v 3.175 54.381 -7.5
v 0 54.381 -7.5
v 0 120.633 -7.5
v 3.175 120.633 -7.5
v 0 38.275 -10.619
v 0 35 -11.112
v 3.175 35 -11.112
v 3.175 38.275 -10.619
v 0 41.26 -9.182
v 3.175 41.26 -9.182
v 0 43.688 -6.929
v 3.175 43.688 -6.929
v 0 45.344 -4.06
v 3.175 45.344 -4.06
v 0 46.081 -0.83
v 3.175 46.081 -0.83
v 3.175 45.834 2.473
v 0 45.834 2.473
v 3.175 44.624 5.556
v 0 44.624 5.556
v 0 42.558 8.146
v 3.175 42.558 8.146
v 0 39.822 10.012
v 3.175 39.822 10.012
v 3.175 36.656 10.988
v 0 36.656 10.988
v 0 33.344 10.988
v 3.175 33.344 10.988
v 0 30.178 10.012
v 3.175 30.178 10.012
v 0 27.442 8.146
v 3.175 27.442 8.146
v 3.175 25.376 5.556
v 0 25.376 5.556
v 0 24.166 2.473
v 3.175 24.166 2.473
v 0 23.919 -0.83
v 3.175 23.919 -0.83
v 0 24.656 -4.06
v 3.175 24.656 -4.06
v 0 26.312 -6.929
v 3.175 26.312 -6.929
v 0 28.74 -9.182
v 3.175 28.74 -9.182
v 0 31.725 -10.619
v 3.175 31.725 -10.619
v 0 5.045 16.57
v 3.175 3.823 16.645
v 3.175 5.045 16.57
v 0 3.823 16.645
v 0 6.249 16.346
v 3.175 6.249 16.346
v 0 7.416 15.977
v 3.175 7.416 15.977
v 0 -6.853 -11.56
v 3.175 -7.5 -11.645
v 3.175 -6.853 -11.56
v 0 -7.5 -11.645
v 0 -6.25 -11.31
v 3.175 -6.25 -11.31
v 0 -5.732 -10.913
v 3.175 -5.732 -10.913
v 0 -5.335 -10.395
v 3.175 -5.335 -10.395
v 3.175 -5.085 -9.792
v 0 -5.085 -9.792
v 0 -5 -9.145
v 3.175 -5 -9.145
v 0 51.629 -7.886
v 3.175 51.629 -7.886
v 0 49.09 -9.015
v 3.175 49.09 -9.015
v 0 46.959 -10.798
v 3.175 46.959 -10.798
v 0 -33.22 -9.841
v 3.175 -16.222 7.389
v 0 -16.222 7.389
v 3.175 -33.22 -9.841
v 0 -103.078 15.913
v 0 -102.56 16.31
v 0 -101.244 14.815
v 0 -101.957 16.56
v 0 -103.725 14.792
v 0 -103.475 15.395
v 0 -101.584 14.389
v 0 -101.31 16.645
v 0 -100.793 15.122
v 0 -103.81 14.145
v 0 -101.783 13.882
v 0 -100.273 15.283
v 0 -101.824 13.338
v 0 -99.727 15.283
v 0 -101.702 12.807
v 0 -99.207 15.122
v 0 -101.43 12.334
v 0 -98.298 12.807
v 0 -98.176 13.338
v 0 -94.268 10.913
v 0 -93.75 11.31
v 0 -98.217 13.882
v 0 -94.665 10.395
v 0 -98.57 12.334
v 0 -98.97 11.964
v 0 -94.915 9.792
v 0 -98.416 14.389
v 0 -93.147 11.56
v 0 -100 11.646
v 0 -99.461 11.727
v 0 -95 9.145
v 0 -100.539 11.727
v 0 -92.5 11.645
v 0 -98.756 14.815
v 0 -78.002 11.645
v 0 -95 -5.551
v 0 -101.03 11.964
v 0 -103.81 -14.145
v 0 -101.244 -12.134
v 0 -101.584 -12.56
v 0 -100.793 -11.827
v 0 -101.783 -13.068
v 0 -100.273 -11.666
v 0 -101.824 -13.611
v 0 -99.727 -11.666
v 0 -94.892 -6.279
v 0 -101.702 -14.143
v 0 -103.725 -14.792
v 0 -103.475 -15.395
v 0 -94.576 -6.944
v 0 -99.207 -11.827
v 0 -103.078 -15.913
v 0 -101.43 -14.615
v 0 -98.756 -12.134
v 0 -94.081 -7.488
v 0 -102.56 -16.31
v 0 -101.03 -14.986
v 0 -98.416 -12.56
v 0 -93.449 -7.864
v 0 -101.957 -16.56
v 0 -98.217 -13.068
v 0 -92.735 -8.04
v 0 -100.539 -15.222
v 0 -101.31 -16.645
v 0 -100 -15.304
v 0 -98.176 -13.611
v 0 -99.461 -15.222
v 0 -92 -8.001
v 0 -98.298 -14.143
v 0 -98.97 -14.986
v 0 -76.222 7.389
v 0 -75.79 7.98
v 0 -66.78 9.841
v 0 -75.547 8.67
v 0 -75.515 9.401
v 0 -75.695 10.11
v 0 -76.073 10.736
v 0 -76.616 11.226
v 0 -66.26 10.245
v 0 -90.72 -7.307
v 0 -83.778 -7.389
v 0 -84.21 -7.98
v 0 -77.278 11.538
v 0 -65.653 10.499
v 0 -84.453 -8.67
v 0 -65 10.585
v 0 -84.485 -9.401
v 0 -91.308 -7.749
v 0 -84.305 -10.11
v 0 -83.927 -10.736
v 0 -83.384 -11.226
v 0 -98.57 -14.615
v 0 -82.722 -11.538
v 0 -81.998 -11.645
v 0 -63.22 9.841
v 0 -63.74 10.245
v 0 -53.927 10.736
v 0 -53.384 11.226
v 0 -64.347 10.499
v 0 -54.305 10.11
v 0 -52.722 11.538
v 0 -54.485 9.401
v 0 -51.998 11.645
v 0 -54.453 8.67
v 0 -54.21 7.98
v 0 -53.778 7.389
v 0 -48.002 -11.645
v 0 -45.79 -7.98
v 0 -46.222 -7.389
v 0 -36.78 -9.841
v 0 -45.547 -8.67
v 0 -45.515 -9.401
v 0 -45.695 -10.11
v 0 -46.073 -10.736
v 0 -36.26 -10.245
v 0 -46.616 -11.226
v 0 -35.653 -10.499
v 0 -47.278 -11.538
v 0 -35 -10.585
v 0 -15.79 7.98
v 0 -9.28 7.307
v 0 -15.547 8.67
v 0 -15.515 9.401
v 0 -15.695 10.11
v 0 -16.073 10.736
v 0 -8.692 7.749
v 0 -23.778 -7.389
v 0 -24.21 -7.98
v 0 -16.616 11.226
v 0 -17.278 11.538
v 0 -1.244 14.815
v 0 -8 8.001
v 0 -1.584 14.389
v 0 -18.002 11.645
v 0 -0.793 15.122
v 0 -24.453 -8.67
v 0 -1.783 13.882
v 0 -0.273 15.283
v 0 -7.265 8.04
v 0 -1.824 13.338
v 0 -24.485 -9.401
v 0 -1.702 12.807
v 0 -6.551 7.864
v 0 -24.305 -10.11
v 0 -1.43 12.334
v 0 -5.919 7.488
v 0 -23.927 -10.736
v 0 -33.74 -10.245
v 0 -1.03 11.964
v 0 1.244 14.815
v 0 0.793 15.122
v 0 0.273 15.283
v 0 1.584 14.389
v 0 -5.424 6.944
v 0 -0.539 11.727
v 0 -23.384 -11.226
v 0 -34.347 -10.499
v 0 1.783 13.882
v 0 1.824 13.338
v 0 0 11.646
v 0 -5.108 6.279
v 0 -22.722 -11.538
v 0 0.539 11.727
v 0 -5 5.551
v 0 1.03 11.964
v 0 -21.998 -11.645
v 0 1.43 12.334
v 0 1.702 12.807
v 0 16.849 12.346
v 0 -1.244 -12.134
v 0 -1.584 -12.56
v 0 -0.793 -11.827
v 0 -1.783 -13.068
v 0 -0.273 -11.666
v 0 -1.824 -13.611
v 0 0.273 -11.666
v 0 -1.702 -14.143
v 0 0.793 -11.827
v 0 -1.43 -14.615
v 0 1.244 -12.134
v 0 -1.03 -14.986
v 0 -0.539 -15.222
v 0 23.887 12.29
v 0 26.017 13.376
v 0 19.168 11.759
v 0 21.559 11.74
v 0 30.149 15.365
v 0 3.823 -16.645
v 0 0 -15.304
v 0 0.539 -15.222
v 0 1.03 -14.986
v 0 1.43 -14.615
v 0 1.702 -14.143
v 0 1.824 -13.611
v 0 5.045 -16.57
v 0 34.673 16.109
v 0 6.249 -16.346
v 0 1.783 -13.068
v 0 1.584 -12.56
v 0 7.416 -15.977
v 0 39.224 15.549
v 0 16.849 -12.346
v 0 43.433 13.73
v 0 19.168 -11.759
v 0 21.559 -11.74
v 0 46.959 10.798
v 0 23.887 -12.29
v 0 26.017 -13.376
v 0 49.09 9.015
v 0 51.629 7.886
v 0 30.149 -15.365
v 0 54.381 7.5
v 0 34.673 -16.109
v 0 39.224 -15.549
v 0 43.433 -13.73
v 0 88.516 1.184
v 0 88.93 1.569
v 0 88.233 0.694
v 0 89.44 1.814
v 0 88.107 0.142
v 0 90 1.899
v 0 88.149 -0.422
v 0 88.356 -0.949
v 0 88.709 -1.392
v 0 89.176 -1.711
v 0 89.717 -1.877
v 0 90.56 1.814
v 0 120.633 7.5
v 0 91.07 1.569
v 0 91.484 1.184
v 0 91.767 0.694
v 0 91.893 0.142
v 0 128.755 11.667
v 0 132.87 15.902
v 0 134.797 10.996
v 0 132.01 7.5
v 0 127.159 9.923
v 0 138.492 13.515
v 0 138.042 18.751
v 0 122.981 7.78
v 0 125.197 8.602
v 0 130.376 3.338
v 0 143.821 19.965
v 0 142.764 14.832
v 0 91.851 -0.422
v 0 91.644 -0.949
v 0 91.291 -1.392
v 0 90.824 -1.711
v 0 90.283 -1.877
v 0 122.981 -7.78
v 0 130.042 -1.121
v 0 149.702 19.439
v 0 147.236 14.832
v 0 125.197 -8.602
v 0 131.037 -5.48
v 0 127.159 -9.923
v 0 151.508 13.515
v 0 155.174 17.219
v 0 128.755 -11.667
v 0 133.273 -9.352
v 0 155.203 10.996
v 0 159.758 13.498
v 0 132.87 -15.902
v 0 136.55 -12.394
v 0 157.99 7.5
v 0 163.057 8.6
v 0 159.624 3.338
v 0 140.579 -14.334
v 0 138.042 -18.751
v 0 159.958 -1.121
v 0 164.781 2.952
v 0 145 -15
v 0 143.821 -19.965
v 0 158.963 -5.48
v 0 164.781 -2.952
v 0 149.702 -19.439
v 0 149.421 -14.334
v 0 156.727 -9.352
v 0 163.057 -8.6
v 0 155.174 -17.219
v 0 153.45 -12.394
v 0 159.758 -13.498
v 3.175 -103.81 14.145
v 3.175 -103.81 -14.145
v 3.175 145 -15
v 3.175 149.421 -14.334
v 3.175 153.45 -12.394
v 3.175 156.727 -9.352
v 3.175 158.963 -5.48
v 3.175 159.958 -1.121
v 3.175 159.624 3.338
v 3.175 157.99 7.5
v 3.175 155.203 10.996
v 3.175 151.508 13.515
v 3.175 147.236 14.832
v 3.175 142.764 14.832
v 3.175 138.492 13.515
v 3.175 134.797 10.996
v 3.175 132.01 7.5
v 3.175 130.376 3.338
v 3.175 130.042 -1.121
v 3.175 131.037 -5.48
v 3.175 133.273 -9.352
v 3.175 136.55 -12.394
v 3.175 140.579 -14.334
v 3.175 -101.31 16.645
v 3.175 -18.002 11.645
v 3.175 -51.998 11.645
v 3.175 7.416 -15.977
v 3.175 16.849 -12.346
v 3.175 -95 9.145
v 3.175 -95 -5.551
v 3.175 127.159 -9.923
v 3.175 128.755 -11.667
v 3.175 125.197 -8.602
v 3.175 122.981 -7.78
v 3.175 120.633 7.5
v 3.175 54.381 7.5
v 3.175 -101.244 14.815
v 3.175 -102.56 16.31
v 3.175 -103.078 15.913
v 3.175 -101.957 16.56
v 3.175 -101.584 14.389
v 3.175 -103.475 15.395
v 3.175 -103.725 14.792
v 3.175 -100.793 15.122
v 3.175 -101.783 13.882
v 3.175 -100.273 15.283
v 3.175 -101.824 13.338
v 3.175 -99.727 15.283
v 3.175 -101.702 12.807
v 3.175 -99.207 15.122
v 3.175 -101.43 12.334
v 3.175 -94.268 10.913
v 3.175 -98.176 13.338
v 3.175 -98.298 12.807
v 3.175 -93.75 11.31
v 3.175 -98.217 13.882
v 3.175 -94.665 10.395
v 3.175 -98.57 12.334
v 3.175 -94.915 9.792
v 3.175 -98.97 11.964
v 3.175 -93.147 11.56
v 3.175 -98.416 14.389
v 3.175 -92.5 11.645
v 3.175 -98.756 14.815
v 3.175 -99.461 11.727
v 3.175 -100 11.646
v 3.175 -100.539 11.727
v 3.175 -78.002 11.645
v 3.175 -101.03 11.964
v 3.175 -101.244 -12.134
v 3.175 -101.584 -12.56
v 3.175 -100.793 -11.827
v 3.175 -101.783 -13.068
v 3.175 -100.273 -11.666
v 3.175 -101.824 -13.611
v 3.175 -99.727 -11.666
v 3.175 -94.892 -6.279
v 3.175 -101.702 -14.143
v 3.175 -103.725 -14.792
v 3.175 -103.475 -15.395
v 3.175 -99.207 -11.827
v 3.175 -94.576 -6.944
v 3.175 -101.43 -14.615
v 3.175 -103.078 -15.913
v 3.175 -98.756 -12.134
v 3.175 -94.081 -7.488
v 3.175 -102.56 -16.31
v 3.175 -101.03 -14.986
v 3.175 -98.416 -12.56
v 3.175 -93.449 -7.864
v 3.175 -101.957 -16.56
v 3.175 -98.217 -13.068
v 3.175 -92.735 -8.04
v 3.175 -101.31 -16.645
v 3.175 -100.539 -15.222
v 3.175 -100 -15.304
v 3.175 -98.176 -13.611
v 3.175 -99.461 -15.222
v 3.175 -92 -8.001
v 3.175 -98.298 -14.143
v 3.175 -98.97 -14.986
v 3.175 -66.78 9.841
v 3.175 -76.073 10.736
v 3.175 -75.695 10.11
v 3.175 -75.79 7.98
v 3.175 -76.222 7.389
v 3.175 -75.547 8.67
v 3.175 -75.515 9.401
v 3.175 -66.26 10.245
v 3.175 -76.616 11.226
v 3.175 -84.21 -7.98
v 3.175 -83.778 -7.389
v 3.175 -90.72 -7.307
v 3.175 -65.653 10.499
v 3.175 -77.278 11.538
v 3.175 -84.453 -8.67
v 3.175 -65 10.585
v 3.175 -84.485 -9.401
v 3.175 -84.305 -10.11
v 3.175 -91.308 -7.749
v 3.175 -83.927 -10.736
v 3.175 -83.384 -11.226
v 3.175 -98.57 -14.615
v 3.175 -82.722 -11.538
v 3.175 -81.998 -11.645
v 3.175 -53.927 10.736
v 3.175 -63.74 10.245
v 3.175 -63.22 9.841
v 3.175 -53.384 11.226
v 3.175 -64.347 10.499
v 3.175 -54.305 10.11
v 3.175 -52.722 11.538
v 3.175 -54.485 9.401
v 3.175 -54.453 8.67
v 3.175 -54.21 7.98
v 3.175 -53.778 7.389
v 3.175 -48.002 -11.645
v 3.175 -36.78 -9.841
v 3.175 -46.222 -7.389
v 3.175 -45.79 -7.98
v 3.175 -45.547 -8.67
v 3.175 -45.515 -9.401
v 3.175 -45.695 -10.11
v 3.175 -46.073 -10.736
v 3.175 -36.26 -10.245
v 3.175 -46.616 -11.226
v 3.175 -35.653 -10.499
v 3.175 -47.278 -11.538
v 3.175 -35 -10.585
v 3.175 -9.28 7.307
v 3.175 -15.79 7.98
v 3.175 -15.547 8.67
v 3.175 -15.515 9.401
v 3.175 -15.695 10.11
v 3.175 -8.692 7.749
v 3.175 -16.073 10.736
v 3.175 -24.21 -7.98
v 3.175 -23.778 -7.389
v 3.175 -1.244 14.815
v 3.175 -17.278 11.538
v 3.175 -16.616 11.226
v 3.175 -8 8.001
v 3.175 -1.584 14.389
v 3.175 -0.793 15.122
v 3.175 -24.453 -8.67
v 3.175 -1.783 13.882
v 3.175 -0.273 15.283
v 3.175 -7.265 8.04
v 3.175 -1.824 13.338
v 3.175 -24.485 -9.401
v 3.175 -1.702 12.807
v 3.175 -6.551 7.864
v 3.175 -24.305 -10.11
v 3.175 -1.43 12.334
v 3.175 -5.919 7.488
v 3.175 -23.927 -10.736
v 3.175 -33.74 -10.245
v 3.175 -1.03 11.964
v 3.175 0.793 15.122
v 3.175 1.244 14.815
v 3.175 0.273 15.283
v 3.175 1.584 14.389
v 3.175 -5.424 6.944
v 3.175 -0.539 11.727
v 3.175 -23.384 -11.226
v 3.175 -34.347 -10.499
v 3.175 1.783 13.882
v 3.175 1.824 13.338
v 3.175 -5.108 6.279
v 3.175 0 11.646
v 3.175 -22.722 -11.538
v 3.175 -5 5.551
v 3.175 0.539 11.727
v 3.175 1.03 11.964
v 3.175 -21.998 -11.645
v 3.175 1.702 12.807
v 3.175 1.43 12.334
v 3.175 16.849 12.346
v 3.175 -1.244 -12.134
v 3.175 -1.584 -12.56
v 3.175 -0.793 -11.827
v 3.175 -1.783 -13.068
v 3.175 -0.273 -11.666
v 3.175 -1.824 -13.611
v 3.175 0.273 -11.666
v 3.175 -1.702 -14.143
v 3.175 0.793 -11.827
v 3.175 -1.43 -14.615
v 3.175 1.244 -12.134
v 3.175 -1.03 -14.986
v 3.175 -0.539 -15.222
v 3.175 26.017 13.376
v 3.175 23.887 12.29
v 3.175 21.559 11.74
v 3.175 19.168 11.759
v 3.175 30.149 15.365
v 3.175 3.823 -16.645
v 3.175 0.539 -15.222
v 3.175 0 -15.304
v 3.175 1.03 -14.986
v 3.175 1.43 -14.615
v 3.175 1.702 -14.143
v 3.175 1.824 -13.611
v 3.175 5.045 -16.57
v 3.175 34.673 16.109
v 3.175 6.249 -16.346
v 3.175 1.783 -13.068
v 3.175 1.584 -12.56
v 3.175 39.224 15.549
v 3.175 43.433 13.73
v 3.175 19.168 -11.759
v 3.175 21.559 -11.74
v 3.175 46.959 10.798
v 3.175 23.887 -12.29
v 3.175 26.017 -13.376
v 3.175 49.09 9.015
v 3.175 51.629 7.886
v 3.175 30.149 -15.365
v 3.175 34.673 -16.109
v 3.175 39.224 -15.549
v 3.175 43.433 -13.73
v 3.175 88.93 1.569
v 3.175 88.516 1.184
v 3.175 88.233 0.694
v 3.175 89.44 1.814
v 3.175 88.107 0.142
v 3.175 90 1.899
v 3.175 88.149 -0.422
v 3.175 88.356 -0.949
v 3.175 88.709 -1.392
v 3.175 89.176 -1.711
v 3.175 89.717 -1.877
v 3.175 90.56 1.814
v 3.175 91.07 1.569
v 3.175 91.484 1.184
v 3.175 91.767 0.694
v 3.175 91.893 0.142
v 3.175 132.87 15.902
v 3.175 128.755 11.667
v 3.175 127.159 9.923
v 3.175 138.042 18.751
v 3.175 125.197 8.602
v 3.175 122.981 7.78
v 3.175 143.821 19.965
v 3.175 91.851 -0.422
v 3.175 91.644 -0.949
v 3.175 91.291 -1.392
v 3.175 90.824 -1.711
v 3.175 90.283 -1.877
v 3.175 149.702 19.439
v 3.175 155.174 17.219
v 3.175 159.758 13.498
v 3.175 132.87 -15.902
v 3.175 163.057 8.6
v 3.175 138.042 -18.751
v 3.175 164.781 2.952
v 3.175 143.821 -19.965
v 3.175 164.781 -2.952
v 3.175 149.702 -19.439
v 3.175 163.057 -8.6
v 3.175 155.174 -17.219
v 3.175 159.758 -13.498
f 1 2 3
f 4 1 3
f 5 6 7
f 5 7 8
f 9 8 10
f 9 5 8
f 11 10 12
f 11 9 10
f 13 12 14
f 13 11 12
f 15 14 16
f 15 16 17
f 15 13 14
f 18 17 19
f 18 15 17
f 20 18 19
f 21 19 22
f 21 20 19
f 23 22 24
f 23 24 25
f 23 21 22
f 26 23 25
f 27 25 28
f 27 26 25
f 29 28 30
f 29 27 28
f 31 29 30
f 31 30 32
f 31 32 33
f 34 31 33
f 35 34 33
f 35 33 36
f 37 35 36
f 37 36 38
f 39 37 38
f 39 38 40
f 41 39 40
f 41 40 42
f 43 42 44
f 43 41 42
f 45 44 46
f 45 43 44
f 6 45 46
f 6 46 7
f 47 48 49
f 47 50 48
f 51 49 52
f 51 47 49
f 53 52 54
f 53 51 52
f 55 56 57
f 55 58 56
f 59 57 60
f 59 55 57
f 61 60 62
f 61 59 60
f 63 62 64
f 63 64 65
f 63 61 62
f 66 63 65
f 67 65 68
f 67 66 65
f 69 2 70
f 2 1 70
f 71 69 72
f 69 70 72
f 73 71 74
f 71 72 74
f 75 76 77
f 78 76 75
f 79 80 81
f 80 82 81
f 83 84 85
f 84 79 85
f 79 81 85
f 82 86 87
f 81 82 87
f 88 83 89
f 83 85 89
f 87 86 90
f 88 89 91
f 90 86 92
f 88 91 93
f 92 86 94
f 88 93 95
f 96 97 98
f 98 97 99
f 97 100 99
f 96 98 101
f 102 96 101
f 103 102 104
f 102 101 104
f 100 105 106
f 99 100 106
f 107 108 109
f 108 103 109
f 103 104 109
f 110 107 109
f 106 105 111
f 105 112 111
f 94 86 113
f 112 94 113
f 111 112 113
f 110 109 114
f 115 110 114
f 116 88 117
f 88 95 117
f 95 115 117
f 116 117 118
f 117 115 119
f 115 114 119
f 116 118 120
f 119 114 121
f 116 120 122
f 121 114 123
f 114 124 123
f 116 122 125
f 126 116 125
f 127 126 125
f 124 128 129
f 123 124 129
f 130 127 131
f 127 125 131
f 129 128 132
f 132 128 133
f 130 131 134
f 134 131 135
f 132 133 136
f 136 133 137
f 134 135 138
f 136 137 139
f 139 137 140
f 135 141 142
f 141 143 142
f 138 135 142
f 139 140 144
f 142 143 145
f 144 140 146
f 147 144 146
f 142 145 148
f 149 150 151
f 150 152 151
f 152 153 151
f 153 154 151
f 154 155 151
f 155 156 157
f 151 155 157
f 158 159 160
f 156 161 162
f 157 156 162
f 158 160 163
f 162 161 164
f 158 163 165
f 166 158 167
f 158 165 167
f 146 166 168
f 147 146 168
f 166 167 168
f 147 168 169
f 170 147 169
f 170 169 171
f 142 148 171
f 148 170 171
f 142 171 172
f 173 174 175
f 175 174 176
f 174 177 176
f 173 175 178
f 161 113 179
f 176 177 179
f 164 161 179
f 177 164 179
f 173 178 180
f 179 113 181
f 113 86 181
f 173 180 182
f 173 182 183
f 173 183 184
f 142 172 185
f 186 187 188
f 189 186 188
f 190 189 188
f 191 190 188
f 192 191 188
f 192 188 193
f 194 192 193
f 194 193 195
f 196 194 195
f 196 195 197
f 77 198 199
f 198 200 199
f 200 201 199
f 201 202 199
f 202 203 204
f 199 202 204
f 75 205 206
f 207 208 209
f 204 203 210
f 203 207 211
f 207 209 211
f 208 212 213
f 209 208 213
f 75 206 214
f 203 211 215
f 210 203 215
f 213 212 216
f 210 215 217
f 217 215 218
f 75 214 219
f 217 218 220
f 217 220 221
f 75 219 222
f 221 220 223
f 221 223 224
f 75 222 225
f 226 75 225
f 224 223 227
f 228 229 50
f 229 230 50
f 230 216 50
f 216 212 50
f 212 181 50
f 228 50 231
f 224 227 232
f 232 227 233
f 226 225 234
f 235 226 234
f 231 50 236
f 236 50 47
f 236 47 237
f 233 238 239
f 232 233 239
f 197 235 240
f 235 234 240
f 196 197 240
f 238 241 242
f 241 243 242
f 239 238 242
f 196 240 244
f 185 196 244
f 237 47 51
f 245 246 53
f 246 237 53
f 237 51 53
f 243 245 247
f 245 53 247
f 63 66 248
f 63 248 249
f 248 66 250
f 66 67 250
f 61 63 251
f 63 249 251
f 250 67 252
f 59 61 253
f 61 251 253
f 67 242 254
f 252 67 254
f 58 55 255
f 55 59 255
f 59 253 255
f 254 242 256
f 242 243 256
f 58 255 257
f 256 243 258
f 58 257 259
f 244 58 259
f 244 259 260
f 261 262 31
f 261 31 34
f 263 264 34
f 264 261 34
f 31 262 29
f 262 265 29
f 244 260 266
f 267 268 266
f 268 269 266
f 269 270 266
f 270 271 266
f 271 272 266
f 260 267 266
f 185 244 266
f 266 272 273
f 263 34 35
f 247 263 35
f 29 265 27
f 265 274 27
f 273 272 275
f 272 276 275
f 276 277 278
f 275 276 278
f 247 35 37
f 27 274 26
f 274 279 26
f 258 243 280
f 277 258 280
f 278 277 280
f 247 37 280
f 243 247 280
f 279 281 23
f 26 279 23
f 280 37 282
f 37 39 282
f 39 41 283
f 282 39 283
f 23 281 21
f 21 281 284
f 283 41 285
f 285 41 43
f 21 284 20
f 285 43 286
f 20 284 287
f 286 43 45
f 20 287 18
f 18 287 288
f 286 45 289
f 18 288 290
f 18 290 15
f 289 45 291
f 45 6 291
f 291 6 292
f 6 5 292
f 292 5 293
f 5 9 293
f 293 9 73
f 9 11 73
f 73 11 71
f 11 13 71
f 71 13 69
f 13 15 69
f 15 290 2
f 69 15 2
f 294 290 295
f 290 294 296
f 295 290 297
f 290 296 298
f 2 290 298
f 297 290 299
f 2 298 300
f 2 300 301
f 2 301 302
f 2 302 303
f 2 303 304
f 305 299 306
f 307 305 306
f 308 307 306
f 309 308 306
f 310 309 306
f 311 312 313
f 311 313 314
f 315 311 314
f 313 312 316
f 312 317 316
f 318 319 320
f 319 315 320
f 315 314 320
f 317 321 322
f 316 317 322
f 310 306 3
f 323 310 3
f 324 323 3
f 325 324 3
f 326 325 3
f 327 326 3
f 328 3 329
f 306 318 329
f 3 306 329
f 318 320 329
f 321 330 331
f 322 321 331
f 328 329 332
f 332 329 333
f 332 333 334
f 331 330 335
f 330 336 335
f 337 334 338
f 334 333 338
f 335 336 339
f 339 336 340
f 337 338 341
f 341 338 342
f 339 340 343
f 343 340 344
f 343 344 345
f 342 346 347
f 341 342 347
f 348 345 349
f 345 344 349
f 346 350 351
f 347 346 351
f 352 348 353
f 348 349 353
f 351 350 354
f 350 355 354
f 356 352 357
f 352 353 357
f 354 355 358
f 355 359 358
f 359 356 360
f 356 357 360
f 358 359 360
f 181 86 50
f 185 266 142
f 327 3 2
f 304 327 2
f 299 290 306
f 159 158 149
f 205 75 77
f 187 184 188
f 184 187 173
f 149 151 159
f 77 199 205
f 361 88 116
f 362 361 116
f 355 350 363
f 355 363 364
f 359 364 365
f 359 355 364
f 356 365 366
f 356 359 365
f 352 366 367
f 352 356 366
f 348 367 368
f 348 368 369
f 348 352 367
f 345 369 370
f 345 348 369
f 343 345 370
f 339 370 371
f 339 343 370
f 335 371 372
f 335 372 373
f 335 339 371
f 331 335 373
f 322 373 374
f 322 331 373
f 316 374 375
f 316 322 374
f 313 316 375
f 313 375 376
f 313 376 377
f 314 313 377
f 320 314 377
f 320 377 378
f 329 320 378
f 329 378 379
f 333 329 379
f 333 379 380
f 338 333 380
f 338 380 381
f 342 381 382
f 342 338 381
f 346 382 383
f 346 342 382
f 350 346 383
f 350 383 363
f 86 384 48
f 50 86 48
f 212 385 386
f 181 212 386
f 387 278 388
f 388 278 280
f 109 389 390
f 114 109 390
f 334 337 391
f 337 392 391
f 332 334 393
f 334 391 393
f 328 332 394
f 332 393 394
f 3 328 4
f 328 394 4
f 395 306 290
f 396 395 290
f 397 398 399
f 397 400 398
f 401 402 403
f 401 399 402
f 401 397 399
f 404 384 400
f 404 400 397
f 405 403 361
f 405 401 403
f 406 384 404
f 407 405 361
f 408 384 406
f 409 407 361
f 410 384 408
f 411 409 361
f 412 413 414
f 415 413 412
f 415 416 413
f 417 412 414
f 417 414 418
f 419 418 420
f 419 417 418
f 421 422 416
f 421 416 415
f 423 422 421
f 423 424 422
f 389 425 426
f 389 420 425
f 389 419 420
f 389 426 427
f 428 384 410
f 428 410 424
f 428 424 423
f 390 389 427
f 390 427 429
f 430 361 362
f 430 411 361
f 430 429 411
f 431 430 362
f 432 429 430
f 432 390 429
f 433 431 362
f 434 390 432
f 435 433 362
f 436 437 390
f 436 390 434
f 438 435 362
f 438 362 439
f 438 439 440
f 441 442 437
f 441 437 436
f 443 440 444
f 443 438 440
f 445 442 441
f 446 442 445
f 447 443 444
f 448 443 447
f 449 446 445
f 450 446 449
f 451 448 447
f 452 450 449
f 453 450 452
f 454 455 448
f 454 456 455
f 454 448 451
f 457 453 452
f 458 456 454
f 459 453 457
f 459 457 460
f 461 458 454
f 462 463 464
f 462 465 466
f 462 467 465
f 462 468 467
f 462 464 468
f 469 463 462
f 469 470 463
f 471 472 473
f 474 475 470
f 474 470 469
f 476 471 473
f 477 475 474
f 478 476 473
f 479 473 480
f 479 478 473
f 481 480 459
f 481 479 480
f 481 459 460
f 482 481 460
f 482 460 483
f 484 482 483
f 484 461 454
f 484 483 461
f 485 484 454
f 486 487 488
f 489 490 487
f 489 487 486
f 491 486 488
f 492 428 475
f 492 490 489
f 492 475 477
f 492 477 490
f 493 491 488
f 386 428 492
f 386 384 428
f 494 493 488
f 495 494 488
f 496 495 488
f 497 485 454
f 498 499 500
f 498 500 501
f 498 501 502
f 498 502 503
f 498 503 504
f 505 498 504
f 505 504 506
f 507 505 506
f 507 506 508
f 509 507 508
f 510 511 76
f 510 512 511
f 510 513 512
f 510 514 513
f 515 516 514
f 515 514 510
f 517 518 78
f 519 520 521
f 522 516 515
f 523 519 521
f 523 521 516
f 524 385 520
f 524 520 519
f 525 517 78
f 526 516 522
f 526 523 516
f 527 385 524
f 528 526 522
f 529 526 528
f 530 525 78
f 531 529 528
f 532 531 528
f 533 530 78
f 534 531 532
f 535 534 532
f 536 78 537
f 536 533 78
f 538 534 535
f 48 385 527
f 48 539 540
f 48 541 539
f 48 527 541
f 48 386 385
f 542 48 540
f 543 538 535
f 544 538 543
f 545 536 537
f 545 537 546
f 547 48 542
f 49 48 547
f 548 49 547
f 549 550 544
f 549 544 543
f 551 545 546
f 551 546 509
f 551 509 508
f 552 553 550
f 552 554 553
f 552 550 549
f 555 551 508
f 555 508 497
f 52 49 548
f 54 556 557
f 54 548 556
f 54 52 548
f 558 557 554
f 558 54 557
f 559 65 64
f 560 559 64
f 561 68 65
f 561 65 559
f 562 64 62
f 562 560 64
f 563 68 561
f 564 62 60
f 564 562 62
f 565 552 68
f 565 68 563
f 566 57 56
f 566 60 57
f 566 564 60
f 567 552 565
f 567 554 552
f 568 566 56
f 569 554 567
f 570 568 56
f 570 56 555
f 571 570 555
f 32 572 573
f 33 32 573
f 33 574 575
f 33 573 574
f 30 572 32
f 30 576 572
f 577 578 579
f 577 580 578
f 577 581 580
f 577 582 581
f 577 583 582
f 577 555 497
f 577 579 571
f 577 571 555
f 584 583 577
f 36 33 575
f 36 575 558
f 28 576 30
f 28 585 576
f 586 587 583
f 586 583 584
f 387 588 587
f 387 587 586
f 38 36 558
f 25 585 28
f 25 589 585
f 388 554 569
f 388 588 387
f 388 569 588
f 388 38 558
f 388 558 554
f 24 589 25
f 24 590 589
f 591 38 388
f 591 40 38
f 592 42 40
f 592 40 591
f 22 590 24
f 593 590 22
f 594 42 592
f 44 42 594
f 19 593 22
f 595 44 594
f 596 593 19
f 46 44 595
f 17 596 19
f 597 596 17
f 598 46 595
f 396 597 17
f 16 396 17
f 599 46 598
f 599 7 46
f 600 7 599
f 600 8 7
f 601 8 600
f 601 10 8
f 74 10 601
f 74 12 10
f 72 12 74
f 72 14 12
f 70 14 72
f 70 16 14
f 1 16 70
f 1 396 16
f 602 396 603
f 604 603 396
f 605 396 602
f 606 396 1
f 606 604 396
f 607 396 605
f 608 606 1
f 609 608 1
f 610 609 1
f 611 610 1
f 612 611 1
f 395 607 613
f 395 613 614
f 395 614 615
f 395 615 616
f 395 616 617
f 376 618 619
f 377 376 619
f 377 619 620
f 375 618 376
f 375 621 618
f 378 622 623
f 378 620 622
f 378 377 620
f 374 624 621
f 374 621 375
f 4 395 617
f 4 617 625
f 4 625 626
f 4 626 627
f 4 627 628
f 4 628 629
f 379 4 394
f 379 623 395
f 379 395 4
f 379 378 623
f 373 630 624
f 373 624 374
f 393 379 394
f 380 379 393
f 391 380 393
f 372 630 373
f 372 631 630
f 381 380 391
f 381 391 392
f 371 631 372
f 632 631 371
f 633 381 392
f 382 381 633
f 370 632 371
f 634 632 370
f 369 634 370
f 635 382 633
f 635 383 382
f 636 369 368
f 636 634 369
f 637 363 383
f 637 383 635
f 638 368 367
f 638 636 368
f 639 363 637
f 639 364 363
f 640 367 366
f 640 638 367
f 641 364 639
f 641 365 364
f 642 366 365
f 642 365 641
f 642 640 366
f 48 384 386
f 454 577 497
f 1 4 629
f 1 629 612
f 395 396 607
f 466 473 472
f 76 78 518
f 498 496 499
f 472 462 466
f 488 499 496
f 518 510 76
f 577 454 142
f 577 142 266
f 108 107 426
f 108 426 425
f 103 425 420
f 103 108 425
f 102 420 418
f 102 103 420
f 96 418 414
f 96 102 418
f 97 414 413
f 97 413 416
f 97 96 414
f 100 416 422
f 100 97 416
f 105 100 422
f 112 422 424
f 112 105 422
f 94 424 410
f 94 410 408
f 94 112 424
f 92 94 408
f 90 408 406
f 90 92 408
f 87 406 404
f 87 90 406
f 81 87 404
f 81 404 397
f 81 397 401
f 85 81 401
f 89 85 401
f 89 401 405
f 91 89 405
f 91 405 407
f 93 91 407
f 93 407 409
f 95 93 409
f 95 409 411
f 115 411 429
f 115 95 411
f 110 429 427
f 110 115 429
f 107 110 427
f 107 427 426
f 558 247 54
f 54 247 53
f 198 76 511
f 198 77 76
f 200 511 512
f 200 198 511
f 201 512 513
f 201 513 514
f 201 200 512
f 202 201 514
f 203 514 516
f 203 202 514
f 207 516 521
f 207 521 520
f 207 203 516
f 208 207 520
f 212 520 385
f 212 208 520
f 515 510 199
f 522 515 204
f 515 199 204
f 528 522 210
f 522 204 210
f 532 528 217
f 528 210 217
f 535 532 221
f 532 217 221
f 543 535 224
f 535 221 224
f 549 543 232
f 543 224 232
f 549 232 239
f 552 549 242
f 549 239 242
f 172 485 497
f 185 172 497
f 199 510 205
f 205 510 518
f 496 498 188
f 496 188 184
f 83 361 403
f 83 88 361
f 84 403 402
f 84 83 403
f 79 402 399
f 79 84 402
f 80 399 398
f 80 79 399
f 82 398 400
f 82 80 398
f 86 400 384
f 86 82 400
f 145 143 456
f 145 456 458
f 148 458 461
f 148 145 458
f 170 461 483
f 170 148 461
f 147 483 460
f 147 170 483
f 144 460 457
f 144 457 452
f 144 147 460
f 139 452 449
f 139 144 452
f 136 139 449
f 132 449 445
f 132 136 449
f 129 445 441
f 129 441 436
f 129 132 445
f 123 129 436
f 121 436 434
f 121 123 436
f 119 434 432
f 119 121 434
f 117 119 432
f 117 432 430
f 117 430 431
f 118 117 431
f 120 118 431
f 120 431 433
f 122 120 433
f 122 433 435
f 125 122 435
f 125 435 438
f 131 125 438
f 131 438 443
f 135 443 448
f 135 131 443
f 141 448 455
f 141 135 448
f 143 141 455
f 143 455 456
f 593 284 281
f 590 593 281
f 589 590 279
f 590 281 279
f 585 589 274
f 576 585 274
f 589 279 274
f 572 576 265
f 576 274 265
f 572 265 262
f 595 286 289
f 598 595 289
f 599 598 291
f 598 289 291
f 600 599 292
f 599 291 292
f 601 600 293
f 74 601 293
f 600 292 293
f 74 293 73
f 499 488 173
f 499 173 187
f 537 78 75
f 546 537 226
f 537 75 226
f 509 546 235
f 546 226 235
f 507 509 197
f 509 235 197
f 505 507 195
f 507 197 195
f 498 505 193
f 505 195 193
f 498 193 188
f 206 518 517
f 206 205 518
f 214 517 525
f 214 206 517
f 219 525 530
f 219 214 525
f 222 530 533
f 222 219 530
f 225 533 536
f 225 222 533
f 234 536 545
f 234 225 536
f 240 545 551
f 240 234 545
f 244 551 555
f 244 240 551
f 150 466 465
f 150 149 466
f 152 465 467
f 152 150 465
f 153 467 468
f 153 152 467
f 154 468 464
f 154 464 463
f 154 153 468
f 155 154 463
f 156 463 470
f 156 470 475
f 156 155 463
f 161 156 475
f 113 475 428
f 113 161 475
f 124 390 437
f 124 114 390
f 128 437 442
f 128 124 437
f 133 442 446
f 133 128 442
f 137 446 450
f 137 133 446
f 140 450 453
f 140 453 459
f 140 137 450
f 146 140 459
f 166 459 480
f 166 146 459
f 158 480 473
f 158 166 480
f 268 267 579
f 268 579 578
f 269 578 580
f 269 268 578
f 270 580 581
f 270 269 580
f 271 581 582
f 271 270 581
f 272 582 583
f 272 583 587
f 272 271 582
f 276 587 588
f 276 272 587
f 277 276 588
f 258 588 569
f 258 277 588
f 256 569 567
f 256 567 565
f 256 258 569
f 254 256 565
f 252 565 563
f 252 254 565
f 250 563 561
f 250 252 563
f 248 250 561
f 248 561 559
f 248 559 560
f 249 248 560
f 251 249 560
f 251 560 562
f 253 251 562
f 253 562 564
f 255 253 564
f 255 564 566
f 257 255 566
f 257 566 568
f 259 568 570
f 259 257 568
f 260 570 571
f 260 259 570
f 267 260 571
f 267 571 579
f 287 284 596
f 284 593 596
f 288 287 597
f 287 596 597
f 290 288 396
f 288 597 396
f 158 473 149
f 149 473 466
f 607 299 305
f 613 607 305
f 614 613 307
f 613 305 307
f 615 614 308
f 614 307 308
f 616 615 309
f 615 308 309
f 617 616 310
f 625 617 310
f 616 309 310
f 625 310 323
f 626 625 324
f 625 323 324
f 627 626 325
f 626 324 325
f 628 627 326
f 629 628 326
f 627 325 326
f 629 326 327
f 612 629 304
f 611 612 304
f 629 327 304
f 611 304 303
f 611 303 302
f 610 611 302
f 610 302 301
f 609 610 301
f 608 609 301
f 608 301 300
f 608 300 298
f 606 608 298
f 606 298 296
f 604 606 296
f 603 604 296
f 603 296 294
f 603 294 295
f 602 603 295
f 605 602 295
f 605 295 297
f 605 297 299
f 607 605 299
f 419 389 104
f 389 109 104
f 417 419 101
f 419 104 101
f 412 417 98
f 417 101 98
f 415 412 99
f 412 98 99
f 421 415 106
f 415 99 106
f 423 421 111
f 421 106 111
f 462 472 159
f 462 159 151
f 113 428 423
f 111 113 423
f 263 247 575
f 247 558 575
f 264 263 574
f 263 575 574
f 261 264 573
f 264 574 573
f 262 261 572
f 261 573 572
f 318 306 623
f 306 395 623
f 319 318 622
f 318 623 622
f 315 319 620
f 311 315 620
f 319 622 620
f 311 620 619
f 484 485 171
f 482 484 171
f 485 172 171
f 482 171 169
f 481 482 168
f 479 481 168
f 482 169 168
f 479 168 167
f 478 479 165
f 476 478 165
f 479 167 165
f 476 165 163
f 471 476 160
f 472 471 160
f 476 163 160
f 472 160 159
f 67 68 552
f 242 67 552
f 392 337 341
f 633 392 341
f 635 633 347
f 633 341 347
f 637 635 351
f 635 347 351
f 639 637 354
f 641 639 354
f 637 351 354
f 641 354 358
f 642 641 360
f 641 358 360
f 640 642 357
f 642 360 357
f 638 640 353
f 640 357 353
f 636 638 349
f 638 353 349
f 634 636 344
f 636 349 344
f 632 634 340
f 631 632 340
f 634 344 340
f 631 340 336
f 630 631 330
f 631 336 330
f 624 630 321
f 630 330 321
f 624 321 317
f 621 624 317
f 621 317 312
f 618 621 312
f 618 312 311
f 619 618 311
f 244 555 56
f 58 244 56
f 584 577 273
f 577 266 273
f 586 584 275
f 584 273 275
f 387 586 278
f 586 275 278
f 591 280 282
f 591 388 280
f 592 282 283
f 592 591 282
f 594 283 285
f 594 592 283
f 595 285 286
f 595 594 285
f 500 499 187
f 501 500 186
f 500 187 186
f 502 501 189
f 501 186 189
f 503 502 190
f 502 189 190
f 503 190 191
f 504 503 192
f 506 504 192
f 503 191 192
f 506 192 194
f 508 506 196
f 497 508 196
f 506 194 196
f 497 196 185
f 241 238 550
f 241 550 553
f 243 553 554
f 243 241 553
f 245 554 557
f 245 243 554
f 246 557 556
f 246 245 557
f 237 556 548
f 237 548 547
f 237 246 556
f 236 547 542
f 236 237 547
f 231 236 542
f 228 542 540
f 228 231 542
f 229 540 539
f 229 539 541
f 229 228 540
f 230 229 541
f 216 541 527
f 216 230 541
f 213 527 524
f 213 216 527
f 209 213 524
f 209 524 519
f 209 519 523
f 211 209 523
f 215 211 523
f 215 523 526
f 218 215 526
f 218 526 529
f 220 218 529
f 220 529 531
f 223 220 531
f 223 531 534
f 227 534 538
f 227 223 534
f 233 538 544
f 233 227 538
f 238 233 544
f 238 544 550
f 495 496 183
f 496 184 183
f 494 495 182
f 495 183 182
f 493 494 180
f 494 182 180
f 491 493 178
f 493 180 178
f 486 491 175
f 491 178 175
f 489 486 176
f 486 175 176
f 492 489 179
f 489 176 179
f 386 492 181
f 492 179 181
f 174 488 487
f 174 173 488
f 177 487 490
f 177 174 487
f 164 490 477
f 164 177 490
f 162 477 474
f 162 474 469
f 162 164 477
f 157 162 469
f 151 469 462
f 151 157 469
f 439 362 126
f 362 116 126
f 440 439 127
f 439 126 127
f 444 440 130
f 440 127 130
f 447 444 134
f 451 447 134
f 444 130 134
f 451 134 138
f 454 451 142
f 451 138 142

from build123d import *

# Parameters (mm, degrees)
SKETCH1_R             = 15
SKETCH1_R_2           = 1.8288
SKETCH1_R_3           = 11.1125
BOSS_EXTRUDE1_DEPTH   = 3.175
CUT_EXTRUDE1_REACH    = 168.331
SKETCH2_W             = 4.112404804
SKETCH2_H             = 127.6975
FILLET3_R             = 2.5
FILLET4_R             = 10
F_6_CLEARANCE_HOLE1_D = 3.7973


with BuildPart() as part:
    # Sketch1 → Boss-Extrude1 (new body)
    with BuildSketch(Plane(origin=(0, 0, 0), x_dir=(0, 0, -1), z_dir=(1, 0, 0))):
        with BuildLine():
            Line((20.757404804, -103.81), (20.757404804, -5))
            Line((20.757404804, -5), (10.169330134, 22.502104942))
            ThreePointArc((10.169330134, 22.502104942), (16.03292259, 36.599390347), (7.5, 49.260527909))
            Line((7.5, 49.260527909), (7.5, 126.459503782))
            ThreePointArc((7.5, 126.459503782), (0, 165), (-7.5, 126.459503782))
            Line((-7.5, 126.459503782), (-7.5, 49.260527909))
            ThreePointArc((-7.5, 49.260527909), (-16.03292259, 36.599390347), (-10.169330134, 22.502104942))
            Line((-10.169330134, 22.502104942), (-20.757404804, -5))
            Line((-20.757404804, -5), (-20.757404804, -103.81))
            Line((-20.757404804, -103.81), (20.757404804, -103.81))
        make_face()
        with Locations((0, 145)):
            Circle(SKETCH1_R, mode=Mode.SUBTRACT)
        with Locations((-13.4747, -100)):
            Circle(SKETCH1_R_2, mode=Mode.SUBTRACT)
        with Locations((13.4747, -100)):
            Circle(SKETCH1_R_2, mode=Mode.SUBTRACT)
        with Locations((-13.4747, 0)):
            Circle(SKETCH1_R_2, mode=Mode.SUBTRACT)
        with Locations((13.4747, 0)):
            Circle(SKETCH1_R_2, mode=Mode.SUBTRACT)
        with Locations((0, 35)):
            Circle(SKETCH1_R_3, mode=Mode.SUBTRACT)
    extrude(amount=BOSS_EXTRUDE1_DEPTH)

    # Sketch2 → Cut-Extrude1 (cut, up to next)
    with BuildSketch(Plane(origin=(3.175, 0, 0), x_dir=(0, 0, -1), z_dir=(1, 0, 0)), mode=Mode.PRIVATE) as cut_extrude1_sk1:
        Polygon((11.645, -5), (-11.645, -5), (11.645, -27.976379872), align=None)
    cut_extrude1_tool1 = extrude(cut_extrude1_sk1.sketch, amount=-CUT_EXTRUDE1_REACH, mode=Mode.PRIVATE) & part.part
    # Sketch2 → Cut-Extrude1 (cut, up to next)
    with BuildSketch(Plane(origin=(3.175, 0, 0), x_dir=(0, 0, -1), z_dir=(1, 0, 0)), mode=Mode.PRIVATE) as cut_extrude1_sk2:
        Polygon((-11.645, -12.023620128), (11.645, -35), (-11.645, -57.976379872), (-11.645, -35), align=None)
    cut_extrude1_tool2 = extrude(cut_extrude1_sk2.sketch, amount=-CUT_EXTRUDE1_REACH, mode=Mode.PRIVATE) & part.part
    # Sketch2 → Cut-Extrude1 (cut, up to next)
    with BuildSketch(Plane(origin=(3.175, 0, 0), x_dir=(0, 0, -1), z_dir=(1, 0, 0)), mode=Mode.PRIVATE) as cut_extrude1_sk3:
        Polygon((-11.645, -72.023620128), (-11.645, -95), (11.645, -95), align=None)
    cut_extrude1_tool3 = extrude(cut_extrude1_sk3.sketch, amount=-CUT_EXTRUDE1_REACH, mode=Mode.PRIVATE) & part.part
    # Sketch2 → Cut-Extrude1 (cut, up to next)
    with BuildSketch(Plane(origin=(3.175, 0, 0), x_dir=(0, 0, -1), z_dir=(1, 0, 0)), mode=Mode.PRIVATE) as cut_extrude1_sk4:
        Polygon((11.645, -42.023620128), (11.645, -65), (11.645, -87.976379872), (-11.645, -65), align=None)
    cut_extrude1_tool4 = extrude(cut_extrude1_sk4.sketch, amount=-CUT_EXTRUDE1_REACH, mode=Mode.PRIVATE) & part.part
    # Sketch2 → Cut-Extrude1 (cut, up to next)
    with BuildSketch(Plane(origin=(3.175, 0, 0), x_dir=(0, 0, -1), z_dir=(1, 0, 0)), mode=Mode.PRIVATE) as cut_extrude1_sk5:
        with Locations((-18.701202402, -39.96125)):
            Rectangle(SKETCH2_W, SKETCH2_H)
    cut_extrude1_tool5 = extrude(cut_extrude1_sk5.sketch, amount=-CUT_EXTRUDE1_REACH, mode=Mode.PRIVATE) & part.part
    # Sketch2 → Cut-Extrude1 (cut, up to next)
    with BuildSketch(Plane(origin=(3.175, 0, 0), x_dir=(0, 0, -1), z_dir=(1, 0, 0)), mode=Mode.PRIVATE) as cut_extrude1_sk6:
        with Locations((18.701202402, -39.96125)):
            Rectangle(SKETCH2_W, SKETCH2_H)
    cut_extrude1_tool6 = extrude(cut_extrude1_sk6.sketch, amount=-CUT_EXTRUDE1_REACH, mode=Mode.PRIVATE) & part.part
    add(cut_extrude1_tool1.solids().sort_by_distance((3.175, -12.658793, -3.881667))[0], mode=Mode.SUBTRACT)
    add(cut_extrude1_tool2.solids().sort_by_distance((3.175, -35, 3.881667))[0], mode=Mode.SUBTRACT)
    add(cut_extrude1_tool3.solids().sort_by_distance((3.175, -87.341207, 3.881667))[0], mode=Mode.SUBTRACT)
    add(cut_extrude1_tool4.solids().sort_by_distance((3.175, -65, -3.881667))[0], mode=Mode.SUBTRACT)
    add(cut_extrude1_tool5.solids().sort_by_distance((3.175, -39.96125, 18.701202))[0], mode=Mode.SUBTRACT)
    add(cut_extrude1_tool6.solids().sort_by_distance((3.175, -39.96125, -18.701202))[0], mode=Mode.SUBTRACT)

    # Fillet3
    fillet3_edges = [part.edges().sort_by_distance(p)[0] for p in [
        (1.5875, -103.81, -16.645),
        (1.5875, -72.023620128, 11.645),
        (1.5875, -95, -11.645),
        (1.5875, -95, 11.645),
        (1.5875, -87.976379872, -11.645),
        (1.5875, -65, 11.645),
        (1.5875, -42.023620128, -11.645),
        (1.5875, -27.976379872, -11.645),
        (1.5875, -5, 11.645),
        (1.5875, -5, -11.645),
        (1.5875, -103.81, 16.645),
        (1.5875, -12.023620128, 11.645),
        (1.5875, -35, -11.645),
        (1.5875, -57.976379872, 11.645),
    ]]
    fillet(fillet3_edges, radius=FILLET3_R)

    # Fillet4
    fillet4_edges = [part.edges().sort_by_distance(p)[0] for p in [
        (1.5875, 5.681808734, -16.645),
        (1.5875, 22.502104942, 10.169330134),
        (1.5875, 49.260527909, 7.5),
        (1.5875, 126.459503782, 7.5),
        (1.5875, 126.459503782, -7.5),
        (1.5875, 49.260527909, -7.5),
        (1.5875, 22.502104942, -10.169330134),
        (1.5875, 5.681808734, 16.645),
    ]]
    fillet(fillet4_edges, radius=FILLET4_R)

    # #6 Clearance Hole1 (through all)
    with Locations(Plane(origin=(3.175, 0, 0), x_dir=(0, 0, -1), z_dir=(1, 0, 0))):
        with Locations((0, 90)):
            Hole(F_6_CLEARANCE_HOLE1_D / 2)


solid = part.part
